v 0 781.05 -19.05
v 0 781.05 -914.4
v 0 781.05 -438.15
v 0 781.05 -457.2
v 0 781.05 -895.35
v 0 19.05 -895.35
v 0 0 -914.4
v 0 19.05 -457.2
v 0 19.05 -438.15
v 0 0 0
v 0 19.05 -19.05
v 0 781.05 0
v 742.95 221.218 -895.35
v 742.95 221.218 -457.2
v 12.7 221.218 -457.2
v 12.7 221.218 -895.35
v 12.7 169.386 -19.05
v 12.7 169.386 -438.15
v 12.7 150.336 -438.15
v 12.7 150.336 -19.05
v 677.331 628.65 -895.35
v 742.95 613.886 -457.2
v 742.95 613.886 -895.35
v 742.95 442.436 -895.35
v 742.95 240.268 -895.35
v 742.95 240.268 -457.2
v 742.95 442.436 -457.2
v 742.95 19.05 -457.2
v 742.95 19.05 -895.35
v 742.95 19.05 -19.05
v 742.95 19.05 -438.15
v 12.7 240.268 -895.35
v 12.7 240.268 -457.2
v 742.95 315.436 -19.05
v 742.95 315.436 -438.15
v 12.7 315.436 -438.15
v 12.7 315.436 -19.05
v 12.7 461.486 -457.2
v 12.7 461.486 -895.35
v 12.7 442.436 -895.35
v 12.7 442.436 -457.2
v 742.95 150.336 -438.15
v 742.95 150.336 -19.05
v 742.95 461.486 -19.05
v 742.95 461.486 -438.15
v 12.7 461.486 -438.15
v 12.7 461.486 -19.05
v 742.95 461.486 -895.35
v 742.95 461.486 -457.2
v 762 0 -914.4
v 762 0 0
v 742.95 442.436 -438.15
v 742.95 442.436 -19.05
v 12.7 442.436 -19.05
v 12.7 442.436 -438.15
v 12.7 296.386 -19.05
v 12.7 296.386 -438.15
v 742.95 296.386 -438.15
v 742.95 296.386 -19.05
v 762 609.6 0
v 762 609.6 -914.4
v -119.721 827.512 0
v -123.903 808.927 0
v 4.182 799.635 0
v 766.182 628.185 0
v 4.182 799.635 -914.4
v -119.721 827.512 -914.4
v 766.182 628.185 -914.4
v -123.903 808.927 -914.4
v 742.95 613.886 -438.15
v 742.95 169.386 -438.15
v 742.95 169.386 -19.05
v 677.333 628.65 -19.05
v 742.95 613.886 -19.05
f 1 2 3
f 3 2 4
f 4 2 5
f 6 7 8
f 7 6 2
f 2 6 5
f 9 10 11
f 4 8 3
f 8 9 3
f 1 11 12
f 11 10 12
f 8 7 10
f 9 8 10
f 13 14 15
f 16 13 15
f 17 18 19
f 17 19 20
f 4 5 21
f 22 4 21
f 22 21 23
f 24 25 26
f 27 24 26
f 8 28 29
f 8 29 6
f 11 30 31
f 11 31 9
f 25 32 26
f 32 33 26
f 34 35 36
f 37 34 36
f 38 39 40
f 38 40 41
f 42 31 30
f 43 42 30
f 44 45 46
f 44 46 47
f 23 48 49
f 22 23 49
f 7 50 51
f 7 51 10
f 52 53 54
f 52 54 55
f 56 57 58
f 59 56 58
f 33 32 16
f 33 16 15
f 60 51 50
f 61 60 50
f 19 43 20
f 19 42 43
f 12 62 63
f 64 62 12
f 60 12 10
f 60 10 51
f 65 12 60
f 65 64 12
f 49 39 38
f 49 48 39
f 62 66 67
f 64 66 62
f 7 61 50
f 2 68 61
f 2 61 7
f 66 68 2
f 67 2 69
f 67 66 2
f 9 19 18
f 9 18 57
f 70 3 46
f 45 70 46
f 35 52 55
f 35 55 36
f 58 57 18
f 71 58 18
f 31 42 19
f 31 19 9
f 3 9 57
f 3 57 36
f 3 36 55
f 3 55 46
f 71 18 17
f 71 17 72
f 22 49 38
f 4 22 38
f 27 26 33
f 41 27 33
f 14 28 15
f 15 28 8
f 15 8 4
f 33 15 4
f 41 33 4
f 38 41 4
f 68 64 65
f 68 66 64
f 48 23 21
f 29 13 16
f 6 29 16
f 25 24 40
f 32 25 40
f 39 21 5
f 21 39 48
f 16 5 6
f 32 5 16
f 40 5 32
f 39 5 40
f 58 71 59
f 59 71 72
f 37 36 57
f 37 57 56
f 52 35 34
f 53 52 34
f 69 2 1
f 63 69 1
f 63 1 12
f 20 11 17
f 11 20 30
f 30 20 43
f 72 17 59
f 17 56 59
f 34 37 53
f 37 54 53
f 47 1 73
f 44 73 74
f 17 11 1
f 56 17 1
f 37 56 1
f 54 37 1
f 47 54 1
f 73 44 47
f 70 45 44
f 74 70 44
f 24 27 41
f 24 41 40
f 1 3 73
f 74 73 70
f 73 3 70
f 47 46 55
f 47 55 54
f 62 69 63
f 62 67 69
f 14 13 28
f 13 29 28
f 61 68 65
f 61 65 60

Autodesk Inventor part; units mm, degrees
ref_plane "YZ Plane" through (0, 0, 0) normal (1, 0, 0) x (0, 1, 0)
ref_plane "XZ Plane" through (0, 0, 0) normal (0, 1, 0) x (-1, 0, 0)
ref_plane "XY Plane" through (0, 0, 0) normal (0, 0, 1) x (1, 0, 0)
sketch "Sketch1" plane through (0, 0, 0) normal (0, 1, 0) x (-1, 0, 0)
  line L0 (0, 0) -> (-762, 0)
  line L1 (-762, 0) -> (-762, -914.4)
  line L2 (-762, -914.4) -> (0, -914.4)
  line L3 (0, -914.4) -> (0, 0)
  dimension "d0" = 762
  dimension "d1" = 914.4
extrude "Extrusion1" add sketch "Sketch1" along normal blind 19.05
sketch "Sketch5" plane through (762, 0, -914.4) normal (0, 0, -1) x (-1, 0, 0)
  line L0 (0, 0) -> (0, 19.05) projected
  line L1 (0, 0) -> (762, 0) projected
  line L2 (762, 0) -> (762, 19.05) projected
  line L3 (762, 628.65) -> (762, 781.05)
  line L4 (762, 781.05) -> (0, 609.6)
  line L5 (0, 609.6) -> (762, 609.6) construction
  line L6 (762, 19.05) -> (762, 628.65) construction
  line L7 (762, 781.05) -> (757.8183, 799.6354)
  line L8 (757.8183, 799.6354) -> (-4.1817, 628.1854)
  line L9 (0, 609.6) -> (84.6693, 628.65) projected
  line L10 (-4.1817, 628.1854) -> (0, 609.6)
  line L11 (0, 19.05) -> (762, 19.05) projected
  dimension "d22" = 152.4
  dimension "d23" = 12.68
  dimension "d25" = 19.05
  dimension "d26" = 90
  dimension "d28" = 90
  dimension "d29" = 90
extrude "Extrusion5" add sketch "Sketch5" against normal up to surface (914.4 mm away) contours L4 L10 L8 L7
sketch "Sketch7" plane through (0, 19.05, 0) normal (0, 1, 0) x (1, 0, 0)
  line L0 (0, 0) -> (762, 0) projected
  line L1 (0, 914.4) -> (0, 0) projected
  line L2 (762, 914.4) -> (0, 914.4) projected
  line L3 (762, 0) -> (762, 914.4) projected
  line L4 (762, 0) -> (762, 914.4) projected
  line L5 (0, 914.4) -> (0, 0) projected
  line L6 (762, 914.4) -> (0, 914.4)
  line L7 (0, 914.4) -> (0, 895.35)
  line L8 (0, 895.35) -> (742.95, 895.35)
  line L9 (762, 895.35) -> (762, 914.4)
  line L10 (762, 914.4) -> (742.95, 914.4)
  line L11 (742.95, 895.35) -> (742.95, 457.2)
  line L12 (742.95, 457.2) -> (762, 457.2)
  line L13 (762, 457.2) -> (762, 914.4)
  dimension "d38" = 19.05
  dimension "d39" = 19.05
  dimension "d40" = 457.2
extrude "Extrusion7" add sketch "Sketch7" along normal blind 609.6 contours L1 L2 L3 L12 L11 L8
sketch "Sketch8" plane through (762, 0, -914.4) normal (0, 0, -1) x (-1, 0, 0)
  line L0 (0, 0) -> (762, 0) projected
  line L1 (762, 0) -> (762, 628.65) projected
  line L2 (84.6667, 628.65) -> (762, 628.65) projected
  line L3 (84.6667, 628.65) -> (762, 781.05) projected
  line L4 (762, 781.05) -> (757.8183, 799.6354) projected
  line L5 (757.8183, 799.6354) -> (-4.1817, 628.1854) projected
  line L6 (-4.1817, 628.1854) -> (0, 609.6) projected
  line L7 (0, 0) -> (0, 609.6) projected
  line L8 (762, 628.65) -> (762, 781.05)
  line L9 (84.6667, 628.65) -> (762, 781.05) projected
  line L10 (762, 781.05) -> (84.6667, 628.65)
  line L11 (84.6667, 628.65) -> (762, 628.65)
extrude "Extrusion8" add sketch "Sketch8" against normal blind 19.05 contours L2 L3 L8
ref_plane "Work Plane2" through (762, 0, -457.2) normal (0, 0, -1) x (-1, 0, 0)
mirror "Mirror1" about plane through (762, 0, -457.2) normal (0, 0, -1) of "Extrusion7"
sketch "Sketch9" plane through (0, 0, 0) normal (0, 0, 1) x (1, 0, 0)
  line L0 (766.1817, 628.1854) -> (762, 609.6) projected
  line L1 (4.1817, 799.6354) -> (766.1817, 628.1854) projected
  line L2 (0, 781.05) -> (4.1817, 799.6354) projected
  line L3 (677.3333, 628.65) -> (0, 781.05) projected
  line L4 (677.3333, 628.65) -> (0, 628.65) projected
  line L5 (0, 0) -> (0, 628.65) projected
  line L6 (0, 0) -> (762, 0) projected
  line L7 (762, 0) -> (762, 609.6) projected
  line L8 (0, 19.05) -> (0, 781.05) projected
  line L9 (0, 628.65) -> (0, 781.05)
  line L10 (0, 781.05) -> (677.3333, 628.65)
  line L11 (0, 781.05) -> (742.95, 613.8863) projected
  line L12 (0, 628.65) -> (677.3333, 628.65)
extrude "Extrusion9" add sketch "Sketch9" against normal blind 19.05 contours L3 L4 L8
sketch "Sketch12" plane through (742.95, 19.05, -895.35) normal (-1, 0, 0) x (0, 0, 1)
  line L0 (0, 594.8363) -> (876.3, 594.8363) projected
  line L1 (0, 0) -> (0, 594.8363) projected
  line L2 (876.3, 0) -> (0, 0) projected
  line L3 (876.3, 0) -> (876.3, 594.8363) projected
  line L4 (0, 0) -> (0, 594.8363) projected
  line L5 (876.3, 0) -> (876.3, 762) projected
  line L6 (0, 442.4363) -> (876.3, 442.4363)
  line L7 (876.3, 442.4363) -> (876.3, 423.3862)
  line L8 (876.3, 423.3862) -> (0, 423.3862)
  line L9 (0, 423.3862) -> (0, 442.4363)
  point P0 (895.35, -19.05)
  dimension "d57" = 19.05
  dimension "d58" = 152.4
extrude "Extrusion10" add sketch "Sketch12" along normal up to surface (742.95 mm away) contours L6 L3 L8 L1
sketch "Sketch13" plane through (742.95, 461.4863, -19.05) normal (0, 1, 0) x (1, 0, 0)
  line L0 (-742.95, 0) -> (-742.95, 876.3) projected
  line L1 (0, 876.3) -> (-742.95, 876.3) projected
  line L2 (0, 0) -> (0, 876.3) projected
  line L3 (-742.95, 0) -> (0, 0) projected
  line L4 (0, 0) -> (0, 876.3) projected
  line L5 (-742.95, 876.3) -> (-742.95, 0) projected
  line L6 (0, 438.15) -> (-742.95, 438.15)
  line L7 (-742.95, 438.15) -> (-742.95, 419.1)
  line L8 (-742.95, 419.1) -> (0, 419.1)
  line L9 (0, 419.1) -> (0, 438.15)
  point P0 (-742.95, -19.05)
  dimension "d61" = 19.05
extrude "Extrusion11" add sketch "Sketch13" along normal up to surface contours L0 L6 L2 L8 surface through (0, 781.05, -914.4) normal (-0.2195, -0.9756, 0)
sketch "Sketch14" plane through (4.1817, 799.6354, -914.4) normal (-0.9756, 0.2195, 0) x (0, 0, 1)
  line L0 (914.4, -19.05) -> (914.4, 0) projected
  line L1 (0, 0) -> (914.4, 0) projected
  line L2 (0, -19.05) -> (0, 0) projected
  line L3 (0, -19.05) -> (19.05, -19.05) projected
  line L4 (19.05, -19.05) -> (457.2, -19.05) projected
  line L5 (457.2, -19.05) -> (476.25, -19.05) projected
  line L6 (476.25, -19.05) -> (895.35, -19.05) projected
  line L7 (895.35, -19.05) -> (914.4, -19.05) projected
  line L8 (914.4, -781.05) -> (914.4, -19.05) projected
  line L9 (0, 0) -> (914.4, 0)
  line L10 (914.4, 0) -> (914.4, -19.05)
  line L11 (914.4, -19.05) -> (0, -19.05)
  line L12 (0, -19.05) -> (0, 0)
extrude "Extrusion12" add sketch "Sketch14" along normal blind 127
sketch "Sketch15" plane through (742.95, 19.05, -895.35) normal (-1, 0, 0) x (0, 0, 1)
  line L0 (876.3, 423.3862) -> (0, 423.3862) projected
  line L1 (0, 0) -> (0, 423.3862) projected
  line L2 (876.3, 0) -> (0, 0) projected
  line L3 (876.3, 0) -> (876.3, 423.3862) projected
  line L4 (876.3, 423.3862) -> (0, 423.3862) projected
  line L5 (0, 0) -> (876.3, 0) projected
  line L6 (438.15, 423.3862) -> (457.2, 423.3862)
  line L7 (457.2, 423.3862) -> (457.2, 0)
  line L8 (457.2, 0) -> (438.15, 0)
  line L9 (438.15, 0) -> (438.15, 423.3862)
  point P0 (895.35, -19.05)
  dimension "d66" = 19.05
extrude "Extrusion13" add sketch "Sketch15" along normal up to surface (742.95 mm away) contours L7 L2 L9 L0
sketch "Sketch16" plane through (742.95, 19.05, -438.15) normal (0, 0, 1) x (1, 0, 0)
  line L0 (-742.95, 0) -> (-742.95, 423.3862) projected
  line L1 (0, 423.3862) -> (-742.95, 423.3862) projected
  line L2 (0, 0) -> (0, 423.3862) projected
  line L3 (-742.95, 0) -> (0, 0) projected
  line L4 (0, 0) -> (0, 423.3862) projected
  line L5 (-742.95, 277.3362) -> (0, 277.3362)
  line L6 (0, 277.3362) -> (0, 296.3862)
  line L7 (0, 296.3862) -> (-742.95, 296.3862)
  line L8 (-742.95, 296.3862) -> (-742.95, 277.3362)
  line L9 (-742.95, 150.3362) -> (0, 150.3362)
  line L10 (0, 150.3362) -> (0, 131.2862)
  line L11 (0, 131.2862) -> (-742.95, 131.2862)
  line L12 (-742.95, 131.2862) -> (-742.95, 150.3362)
  point P0 (-742.95, -19.05)
  dimension "d69" = 19.05
  dimension "d70" = 127
  dimension "d71" = 19.05
  dimension "d72" = 127
extrude "Extrusion14" add sketch "Sketch16" along normal up to surface (419.1 mm away) contours L0 L9 L2 L11 | L0 L7 L2 L5
sketch "Sketch17" plane through (742.95, 19.05, -457.2) normal (0, 0, -1) x (-1, 0, 0)
  line L0 (742.95, 423.3862) -> (0, 423.3862) projected
  line L1 (0, 0) -> (742.95, 0) projected
  line L2 (0, 131.2862) -> (0, 0) projected
  line L3 (0, 277.3362) -> (0, 150.3362) projected
  line L4 (0, 423.3862) -> (0, 296.3862) projected
  line L5 (742.95, 423.3862) -> (742.95, 296.3862) projected
  line L6 (742.95, 277.3362) -> (742.95, 150.3362) projected
  line L7 (742.95, 131.2862) -> (742.95, 0) projected
  line L8 (0, 423.3862) -> (742.95, 0) construction
  line L9 (742.95, 423.3862) -> (0, 0) construction
  line L10 (0, 202.1681) -> (742.95, 202.1681)
  line L11 (742.95, 202.1681) -> (742.95, 221.2181)
  line L12 (742.95, 221.2181) -> (0, 221.2181)
  line L13 (0, 221.2181) -> (0, 202.1681)
  line L14 (0, 202.1681) -> (742.95, 221.2181) construction
  line L15 (742.95, 202.1681) -> (0, 221.2181) construction
  point P0 (742.95, -19.05)
  point P1 (371.475, 211.6931)
  dimension "d75" = 19.05
extrude "Extrusion15" add sketch "Sketch17" along normal up to surface (438.15 mm away)
sketch "Sketch18" plane through (0, 0, -914.4) normal (-1, 0, 0) x (0, 0, 1)
  line L0 (476.25, 442.4362) -> (476.25, 315.4362) projected
  line L1 (19.05, 240.2681) -> (19.05, 442.4362) projected
  line L2 (457.2, 442.4362) -> (19.05, 442.4362) projected
  line L3 (457.2, 240.2681) -> (457.2, 442.4362) projected
  line L4 (457.2, 240.2681) -> (19.05, 240.2681) projected
  line L5 (476.25, 296.3862) -> (476.25, 169.3862) projected
  line L6 (476.25, 296.3862) -> (895.35, 296.3862) projected
  line L7 (895.35, 169.3862) -> (895.35, 296.3862) projected
  line L8 (476.25, 169.3862) -> (895.35, 169.3862) projected
  line L9 (476.25, 150.3362) -> (895.35, 150.3362) projected
  line L10 (895.35, 19.05) -> (895.35, 150.3362) projected
  line L11 (476.25, 19.05) -> (895.35, 19.05) projected
  line L12 (476.25, 150.3362) -> (476.25, 19.05) projected
  line L13 (476.25, 315.4362) -> (895.35, 315.4362) projected
  line L14 (476.25, 442.4362) -> (476.25, 315.4362) projected
  line L15 (895.35, 442.4362) -> (476.25, 442.4362) projected
  line L16 (895.35, 315.4362) -> (895.35, 442.4362) projected
  line L17 (19.05, 461.4863) -> (19.05, 781.05) projected
  line L18 (0, 781.05) -> (19.05, 781.05) projected
  line L19 (0, 0) -> (0, 781.05) projected
  line L20 (0, 0) -> (914.4, 0) projected
  line L21 (914.4, 0) -> (914.4, 781.05) projected
  line L22 (895.35, 781.05) -> (914.4, 781.05) projected
  line L23 (895.35, 461.4863) -> (895.35, 781.05) projected
  line L24 (476.25, 461.4863) -> (895.35, 461.4863) projected
  line L25 (476.25, 461.4863) -> (476.25, 781.05) projected
  line L26 (457.2, 781.05) -> (476.25, 781.05) projected
  line L27 (457.2, 461.4863) -> (457.2, 781.05) projected
  line L28 (19.05, 461.4863) -> (457.2, 461.4863) projected
  line L29 (457.2, 221.2181) -> (19.05, 221.2181) projected
  line L30 (457.2, 19.05) -> (457.2, 221.2181) projected
  line L31 (19.05, 19.05) -> (457.2, 19.05) projected
  line L32 (19.05, 19.05) -> (19.05, 221.2181) projected
  line L33 (19.05, 461.4863) -> (19.05, 613.8863) projected
  line L34 (457.2, 240.2681) -> (457.2, 442.4362) projected
  line L35 (19.05, 461.4863) -> (457.2, 461.4863)
  line L36 (457.2, 461.4863) -> (457.2, 442.4362)
  line L37 (457.2, 442.4362) -> (19.05, 442.4362)
  line L38 (19.05, 442.4362) -> (19.05, 461.4863)
  line L39 (457.2, 240.2681) -> (19.05, 240.2681) projected
  line L40 (457.2, 221.2181) -> (19.05, 221.2181) projected
  line L41 (19.05, 240.2681) -> (457.2, 240.2681)
  line L42 (457.2, 240.2681) -> (457.2, 221.2181)
  line L43 (457.2, 221.2181) -> (19.05, 221.2181)
  line L44 (19.05, 221.2181) -> (19.05, 240.2681)
  line L45 (476.25, 461.4863) -> (476.25, 781.05) projected
  line L46 (895.35, 315.4362) -> (895.35, 442.4362) projected
  line L47 (476.25, 461.4863) -> (895.35, 461.4863)
  line L48 (895.35, 461.4863) -> (895.35, 442.4362)
  line L49 (895.35, 442.4362) -> (476.25, 442.4362)
  line L50 (476.25, 442.4362) -> (476.25, 461.4863)
  line L51 (895.35, 169.3862) -> (895.35, 296.3862) projected
  line L52 (476.25, 315.4362) -> (895.35, 315.4362)
  line L53 (895.35, 315.4362) -> (895.35, 296.3862)
  line L54 (895.35, 296.3862) -> (476.25, 296.3862)
  line L55 (476.25, 296.3862) -> (476.25, 315.4362)
  line L56 (476.25, 169.3862) -> (895.35, 169.3862) projected
  line L57 (895.35, 19.05) -> (895.35, 150.3362) projected
  line L58 (476.25, 169.3862) -> (895.35, 169.3862)
  line L59 (895.35, 169.3862) -> (895.35, 150.3362)
  line L60 (895.35, 150.3362) -> (476.25, 150.3362)
  line L61 (476.25, 150.3362) -> (476.25, 169.3862)
extrude "Extrusion16" cut sketch "Sketch18" against normal blind 12.7 contours L50 L24 L48 L15 | L13 L53 L6 L55 | L8 L59 L9 L61 | L36 L2 L38 L28 | L42 L29 L44 L4
properties part number "Top"
